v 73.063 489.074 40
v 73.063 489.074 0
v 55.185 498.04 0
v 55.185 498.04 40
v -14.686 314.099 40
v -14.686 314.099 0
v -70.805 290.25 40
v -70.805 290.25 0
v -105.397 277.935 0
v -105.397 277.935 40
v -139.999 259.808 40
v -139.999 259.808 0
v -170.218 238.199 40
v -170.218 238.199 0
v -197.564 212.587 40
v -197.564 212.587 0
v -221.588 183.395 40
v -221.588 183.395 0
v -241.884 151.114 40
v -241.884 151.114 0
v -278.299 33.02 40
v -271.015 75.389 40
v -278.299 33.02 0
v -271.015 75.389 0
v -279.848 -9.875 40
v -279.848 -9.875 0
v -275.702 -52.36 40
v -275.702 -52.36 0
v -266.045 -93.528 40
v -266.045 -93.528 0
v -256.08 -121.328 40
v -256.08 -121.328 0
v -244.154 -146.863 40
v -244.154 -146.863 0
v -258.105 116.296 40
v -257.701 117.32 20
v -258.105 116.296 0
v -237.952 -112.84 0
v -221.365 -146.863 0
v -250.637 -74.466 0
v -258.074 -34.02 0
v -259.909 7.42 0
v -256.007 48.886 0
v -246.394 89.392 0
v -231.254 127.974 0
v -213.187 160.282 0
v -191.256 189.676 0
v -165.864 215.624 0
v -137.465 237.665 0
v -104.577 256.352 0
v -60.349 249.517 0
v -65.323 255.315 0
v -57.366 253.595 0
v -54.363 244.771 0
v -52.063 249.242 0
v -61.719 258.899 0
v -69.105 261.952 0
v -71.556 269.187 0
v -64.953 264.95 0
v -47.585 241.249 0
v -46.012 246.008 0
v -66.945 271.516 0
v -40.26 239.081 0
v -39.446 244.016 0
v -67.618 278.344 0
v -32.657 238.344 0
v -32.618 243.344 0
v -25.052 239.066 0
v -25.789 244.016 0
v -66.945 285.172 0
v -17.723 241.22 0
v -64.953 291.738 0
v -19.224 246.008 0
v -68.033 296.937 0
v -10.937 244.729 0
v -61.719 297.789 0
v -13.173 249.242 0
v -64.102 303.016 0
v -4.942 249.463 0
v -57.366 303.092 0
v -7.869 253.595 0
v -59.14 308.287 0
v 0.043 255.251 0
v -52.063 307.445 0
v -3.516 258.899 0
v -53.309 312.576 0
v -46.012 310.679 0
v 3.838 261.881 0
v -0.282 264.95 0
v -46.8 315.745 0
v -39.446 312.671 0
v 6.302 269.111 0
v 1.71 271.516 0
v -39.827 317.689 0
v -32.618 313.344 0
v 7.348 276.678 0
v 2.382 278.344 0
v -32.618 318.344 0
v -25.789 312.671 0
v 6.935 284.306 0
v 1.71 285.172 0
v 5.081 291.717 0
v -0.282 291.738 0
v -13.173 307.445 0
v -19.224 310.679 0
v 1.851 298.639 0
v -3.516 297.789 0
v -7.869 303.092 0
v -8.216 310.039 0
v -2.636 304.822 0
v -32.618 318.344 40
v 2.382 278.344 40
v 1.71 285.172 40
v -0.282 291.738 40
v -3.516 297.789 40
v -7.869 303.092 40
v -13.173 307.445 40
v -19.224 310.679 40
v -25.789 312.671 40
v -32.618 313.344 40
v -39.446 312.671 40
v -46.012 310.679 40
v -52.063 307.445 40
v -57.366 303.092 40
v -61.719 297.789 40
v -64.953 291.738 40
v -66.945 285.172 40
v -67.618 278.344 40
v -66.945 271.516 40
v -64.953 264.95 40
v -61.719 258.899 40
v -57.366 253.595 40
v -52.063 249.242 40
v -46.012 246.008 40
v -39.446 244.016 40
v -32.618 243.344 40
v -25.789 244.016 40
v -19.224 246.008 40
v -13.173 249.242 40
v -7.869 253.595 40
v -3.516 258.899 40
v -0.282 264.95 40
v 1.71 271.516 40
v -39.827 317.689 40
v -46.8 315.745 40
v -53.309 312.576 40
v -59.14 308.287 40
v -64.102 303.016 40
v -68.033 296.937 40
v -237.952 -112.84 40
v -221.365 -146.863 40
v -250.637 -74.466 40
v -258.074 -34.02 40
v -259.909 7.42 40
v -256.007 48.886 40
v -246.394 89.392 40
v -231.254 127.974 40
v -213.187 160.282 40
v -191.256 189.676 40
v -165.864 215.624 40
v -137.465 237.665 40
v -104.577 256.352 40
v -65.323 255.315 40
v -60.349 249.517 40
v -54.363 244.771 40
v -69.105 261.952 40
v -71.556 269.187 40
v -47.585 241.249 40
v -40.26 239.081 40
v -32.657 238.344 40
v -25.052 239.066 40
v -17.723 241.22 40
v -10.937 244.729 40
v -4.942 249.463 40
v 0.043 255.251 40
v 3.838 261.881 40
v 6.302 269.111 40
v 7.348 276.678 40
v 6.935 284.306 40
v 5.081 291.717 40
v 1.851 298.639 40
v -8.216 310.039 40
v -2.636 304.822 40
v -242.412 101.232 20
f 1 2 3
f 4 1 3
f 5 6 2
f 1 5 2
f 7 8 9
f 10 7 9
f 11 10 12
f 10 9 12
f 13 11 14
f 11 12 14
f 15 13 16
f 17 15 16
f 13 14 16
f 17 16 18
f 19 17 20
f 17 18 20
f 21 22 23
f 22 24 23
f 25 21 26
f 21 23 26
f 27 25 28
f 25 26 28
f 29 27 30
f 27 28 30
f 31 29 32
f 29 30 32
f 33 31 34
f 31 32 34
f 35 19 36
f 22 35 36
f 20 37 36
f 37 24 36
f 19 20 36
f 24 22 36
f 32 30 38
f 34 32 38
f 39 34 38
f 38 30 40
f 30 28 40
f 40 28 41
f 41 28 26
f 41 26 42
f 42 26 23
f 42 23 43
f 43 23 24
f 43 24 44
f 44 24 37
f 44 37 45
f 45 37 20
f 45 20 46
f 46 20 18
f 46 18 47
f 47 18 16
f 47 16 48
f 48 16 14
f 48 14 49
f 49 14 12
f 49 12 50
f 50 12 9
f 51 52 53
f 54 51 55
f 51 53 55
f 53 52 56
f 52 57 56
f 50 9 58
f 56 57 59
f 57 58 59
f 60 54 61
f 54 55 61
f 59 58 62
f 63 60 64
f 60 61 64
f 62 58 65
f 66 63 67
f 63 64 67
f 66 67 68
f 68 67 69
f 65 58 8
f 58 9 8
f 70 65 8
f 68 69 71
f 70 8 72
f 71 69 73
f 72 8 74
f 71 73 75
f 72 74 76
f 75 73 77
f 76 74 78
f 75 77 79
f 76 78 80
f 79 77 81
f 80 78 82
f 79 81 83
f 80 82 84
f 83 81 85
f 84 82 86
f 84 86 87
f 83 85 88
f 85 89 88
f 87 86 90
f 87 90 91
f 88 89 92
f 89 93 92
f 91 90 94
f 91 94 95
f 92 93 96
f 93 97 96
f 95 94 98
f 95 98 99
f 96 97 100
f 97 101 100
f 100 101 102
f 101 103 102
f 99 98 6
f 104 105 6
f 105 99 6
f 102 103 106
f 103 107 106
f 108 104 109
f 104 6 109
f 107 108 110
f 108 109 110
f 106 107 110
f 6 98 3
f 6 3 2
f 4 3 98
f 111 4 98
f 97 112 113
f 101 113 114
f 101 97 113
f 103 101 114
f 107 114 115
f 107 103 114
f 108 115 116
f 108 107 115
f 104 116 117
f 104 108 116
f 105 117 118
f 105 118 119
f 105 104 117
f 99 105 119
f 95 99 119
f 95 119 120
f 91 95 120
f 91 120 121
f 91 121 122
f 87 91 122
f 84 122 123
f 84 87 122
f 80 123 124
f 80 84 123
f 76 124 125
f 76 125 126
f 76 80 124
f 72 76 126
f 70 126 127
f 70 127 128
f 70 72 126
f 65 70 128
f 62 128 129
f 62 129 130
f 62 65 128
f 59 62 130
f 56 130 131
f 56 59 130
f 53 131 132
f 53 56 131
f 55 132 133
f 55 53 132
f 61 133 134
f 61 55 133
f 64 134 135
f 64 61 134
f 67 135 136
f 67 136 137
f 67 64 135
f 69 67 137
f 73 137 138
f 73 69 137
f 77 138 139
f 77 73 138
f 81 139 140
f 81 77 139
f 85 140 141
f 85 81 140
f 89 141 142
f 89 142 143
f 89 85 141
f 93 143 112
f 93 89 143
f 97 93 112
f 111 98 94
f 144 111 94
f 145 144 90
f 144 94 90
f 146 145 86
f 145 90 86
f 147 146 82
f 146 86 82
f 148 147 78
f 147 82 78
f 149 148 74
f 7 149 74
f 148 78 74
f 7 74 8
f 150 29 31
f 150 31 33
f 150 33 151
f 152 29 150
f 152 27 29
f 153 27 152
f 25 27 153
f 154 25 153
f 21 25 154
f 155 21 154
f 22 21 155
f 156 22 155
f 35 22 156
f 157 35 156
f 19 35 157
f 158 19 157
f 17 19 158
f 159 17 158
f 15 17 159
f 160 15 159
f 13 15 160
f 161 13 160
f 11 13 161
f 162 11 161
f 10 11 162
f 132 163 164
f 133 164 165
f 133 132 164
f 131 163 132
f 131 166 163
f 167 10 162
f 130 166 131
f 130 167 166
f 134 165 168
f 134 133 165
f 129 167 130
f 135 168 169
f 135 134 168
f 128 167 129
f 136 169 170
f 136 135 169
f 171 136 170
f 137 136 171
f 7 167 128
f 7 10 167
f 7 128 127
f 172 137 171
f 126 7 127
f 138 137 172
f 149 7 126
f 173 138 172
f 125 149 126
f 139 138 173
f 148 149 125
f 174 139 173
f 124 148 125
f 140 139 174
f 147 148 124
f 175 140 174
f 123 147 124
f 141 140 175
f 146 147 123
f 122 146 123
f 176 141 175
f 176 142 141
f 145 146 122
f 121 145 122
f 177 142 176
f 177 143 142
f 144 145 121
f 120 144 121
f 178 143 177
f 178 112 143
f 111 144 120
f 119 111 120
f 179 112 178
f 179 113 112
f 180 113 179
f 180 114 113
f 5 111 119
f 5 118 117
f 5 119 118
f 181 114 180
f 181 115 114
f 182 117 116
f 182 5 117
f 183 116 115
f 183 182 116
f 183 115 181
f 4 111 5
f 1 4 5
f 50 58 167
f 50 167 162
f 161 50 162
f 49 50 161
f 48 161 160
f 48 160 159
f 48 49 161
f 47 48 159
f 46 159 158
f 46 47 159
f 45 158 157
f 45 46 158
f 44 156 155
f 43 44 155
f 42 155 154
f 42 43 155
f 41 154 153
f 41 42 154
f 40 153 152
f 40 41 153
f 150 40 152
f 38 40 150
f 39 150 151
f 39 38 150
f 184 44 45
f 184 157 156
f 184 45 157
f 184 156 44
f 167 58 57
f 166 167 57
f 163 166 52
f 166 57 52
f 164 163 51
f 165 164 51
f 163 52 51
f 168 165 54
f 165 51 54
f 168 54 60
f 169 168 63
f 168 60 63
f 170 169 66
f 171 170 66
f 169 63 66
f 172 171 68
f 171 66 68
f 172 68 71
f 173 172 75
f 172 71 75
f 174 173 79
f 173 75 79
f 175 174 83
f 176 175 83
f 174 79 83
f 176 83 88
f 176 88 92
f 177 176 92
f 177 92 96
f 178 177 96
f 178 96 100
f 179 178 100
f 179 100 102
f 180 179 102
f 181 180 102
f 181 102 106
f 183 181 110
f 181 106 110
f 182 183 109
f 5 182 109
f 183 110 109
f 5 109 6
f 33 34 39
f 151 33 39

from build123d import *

# Parameters (mm, degrees)
CROQUIS1_R               = 35
SALIENTE_EXTRUIR15_DEPTH = 40


with BuildPart() as part:
    # Croquis1 → Saliente-Extruir15 (new body)
    with BuildSketch(Plane.XY):
        with BuildLine():
            Line((-14.686304328, 314.09938136), (73.062849976, 489.074174319))
            Line((73.062849976, 489.074174319), (55.185016864, 498.039835657))
            Line((55.185016864, 498.039835657), (-32.617627004, 318.343715137))
            ThreePointArc((-32.617627004, 318.343715137), (-56.321599928, 310.563610662), (-70.80460356, 290.249798518))
            add(Edge.make_bspline(
                [(-70.80460356, 290.249798518), (-421.705541448, 191.98441708), (-244.154369287, -146.862508424)],
                knots=[3.397241876, 3.397241876, 3.397241876, 5.223953064, 5.223953064, 5.223953064], degree=2, weights=[1, 0.611093045, 1]))
            Line((-244.154369287, -146.862508424), (-221.365281412, -146.862508424))
            add(Edge.make_bspline(
                [(-71.555520961, 269.187274007), (-401.226138708, 167.553458018), (-221.365281412, -146.862508424)],
                knots=[0.278811815, 0.278811815, 0.278811815, 2.122934595, 2.122934595, 2.122934595], degree=2, weights=[1, 0.604178825, 1]))
            ThreePointArc((-71.555520961, 269.187274007), (-7.826633559, 246.952527775), (-14.686304328, 314.09938136))
        make_face()
        with Locations((-32.617627004, 278.343715137)):
            Circle(CROQUIS1_R, mode=Mode.SUBTRACT)
    extrude(amount=SALIENTE_EXTRUIR15_DEPTH)


solid = part.part
